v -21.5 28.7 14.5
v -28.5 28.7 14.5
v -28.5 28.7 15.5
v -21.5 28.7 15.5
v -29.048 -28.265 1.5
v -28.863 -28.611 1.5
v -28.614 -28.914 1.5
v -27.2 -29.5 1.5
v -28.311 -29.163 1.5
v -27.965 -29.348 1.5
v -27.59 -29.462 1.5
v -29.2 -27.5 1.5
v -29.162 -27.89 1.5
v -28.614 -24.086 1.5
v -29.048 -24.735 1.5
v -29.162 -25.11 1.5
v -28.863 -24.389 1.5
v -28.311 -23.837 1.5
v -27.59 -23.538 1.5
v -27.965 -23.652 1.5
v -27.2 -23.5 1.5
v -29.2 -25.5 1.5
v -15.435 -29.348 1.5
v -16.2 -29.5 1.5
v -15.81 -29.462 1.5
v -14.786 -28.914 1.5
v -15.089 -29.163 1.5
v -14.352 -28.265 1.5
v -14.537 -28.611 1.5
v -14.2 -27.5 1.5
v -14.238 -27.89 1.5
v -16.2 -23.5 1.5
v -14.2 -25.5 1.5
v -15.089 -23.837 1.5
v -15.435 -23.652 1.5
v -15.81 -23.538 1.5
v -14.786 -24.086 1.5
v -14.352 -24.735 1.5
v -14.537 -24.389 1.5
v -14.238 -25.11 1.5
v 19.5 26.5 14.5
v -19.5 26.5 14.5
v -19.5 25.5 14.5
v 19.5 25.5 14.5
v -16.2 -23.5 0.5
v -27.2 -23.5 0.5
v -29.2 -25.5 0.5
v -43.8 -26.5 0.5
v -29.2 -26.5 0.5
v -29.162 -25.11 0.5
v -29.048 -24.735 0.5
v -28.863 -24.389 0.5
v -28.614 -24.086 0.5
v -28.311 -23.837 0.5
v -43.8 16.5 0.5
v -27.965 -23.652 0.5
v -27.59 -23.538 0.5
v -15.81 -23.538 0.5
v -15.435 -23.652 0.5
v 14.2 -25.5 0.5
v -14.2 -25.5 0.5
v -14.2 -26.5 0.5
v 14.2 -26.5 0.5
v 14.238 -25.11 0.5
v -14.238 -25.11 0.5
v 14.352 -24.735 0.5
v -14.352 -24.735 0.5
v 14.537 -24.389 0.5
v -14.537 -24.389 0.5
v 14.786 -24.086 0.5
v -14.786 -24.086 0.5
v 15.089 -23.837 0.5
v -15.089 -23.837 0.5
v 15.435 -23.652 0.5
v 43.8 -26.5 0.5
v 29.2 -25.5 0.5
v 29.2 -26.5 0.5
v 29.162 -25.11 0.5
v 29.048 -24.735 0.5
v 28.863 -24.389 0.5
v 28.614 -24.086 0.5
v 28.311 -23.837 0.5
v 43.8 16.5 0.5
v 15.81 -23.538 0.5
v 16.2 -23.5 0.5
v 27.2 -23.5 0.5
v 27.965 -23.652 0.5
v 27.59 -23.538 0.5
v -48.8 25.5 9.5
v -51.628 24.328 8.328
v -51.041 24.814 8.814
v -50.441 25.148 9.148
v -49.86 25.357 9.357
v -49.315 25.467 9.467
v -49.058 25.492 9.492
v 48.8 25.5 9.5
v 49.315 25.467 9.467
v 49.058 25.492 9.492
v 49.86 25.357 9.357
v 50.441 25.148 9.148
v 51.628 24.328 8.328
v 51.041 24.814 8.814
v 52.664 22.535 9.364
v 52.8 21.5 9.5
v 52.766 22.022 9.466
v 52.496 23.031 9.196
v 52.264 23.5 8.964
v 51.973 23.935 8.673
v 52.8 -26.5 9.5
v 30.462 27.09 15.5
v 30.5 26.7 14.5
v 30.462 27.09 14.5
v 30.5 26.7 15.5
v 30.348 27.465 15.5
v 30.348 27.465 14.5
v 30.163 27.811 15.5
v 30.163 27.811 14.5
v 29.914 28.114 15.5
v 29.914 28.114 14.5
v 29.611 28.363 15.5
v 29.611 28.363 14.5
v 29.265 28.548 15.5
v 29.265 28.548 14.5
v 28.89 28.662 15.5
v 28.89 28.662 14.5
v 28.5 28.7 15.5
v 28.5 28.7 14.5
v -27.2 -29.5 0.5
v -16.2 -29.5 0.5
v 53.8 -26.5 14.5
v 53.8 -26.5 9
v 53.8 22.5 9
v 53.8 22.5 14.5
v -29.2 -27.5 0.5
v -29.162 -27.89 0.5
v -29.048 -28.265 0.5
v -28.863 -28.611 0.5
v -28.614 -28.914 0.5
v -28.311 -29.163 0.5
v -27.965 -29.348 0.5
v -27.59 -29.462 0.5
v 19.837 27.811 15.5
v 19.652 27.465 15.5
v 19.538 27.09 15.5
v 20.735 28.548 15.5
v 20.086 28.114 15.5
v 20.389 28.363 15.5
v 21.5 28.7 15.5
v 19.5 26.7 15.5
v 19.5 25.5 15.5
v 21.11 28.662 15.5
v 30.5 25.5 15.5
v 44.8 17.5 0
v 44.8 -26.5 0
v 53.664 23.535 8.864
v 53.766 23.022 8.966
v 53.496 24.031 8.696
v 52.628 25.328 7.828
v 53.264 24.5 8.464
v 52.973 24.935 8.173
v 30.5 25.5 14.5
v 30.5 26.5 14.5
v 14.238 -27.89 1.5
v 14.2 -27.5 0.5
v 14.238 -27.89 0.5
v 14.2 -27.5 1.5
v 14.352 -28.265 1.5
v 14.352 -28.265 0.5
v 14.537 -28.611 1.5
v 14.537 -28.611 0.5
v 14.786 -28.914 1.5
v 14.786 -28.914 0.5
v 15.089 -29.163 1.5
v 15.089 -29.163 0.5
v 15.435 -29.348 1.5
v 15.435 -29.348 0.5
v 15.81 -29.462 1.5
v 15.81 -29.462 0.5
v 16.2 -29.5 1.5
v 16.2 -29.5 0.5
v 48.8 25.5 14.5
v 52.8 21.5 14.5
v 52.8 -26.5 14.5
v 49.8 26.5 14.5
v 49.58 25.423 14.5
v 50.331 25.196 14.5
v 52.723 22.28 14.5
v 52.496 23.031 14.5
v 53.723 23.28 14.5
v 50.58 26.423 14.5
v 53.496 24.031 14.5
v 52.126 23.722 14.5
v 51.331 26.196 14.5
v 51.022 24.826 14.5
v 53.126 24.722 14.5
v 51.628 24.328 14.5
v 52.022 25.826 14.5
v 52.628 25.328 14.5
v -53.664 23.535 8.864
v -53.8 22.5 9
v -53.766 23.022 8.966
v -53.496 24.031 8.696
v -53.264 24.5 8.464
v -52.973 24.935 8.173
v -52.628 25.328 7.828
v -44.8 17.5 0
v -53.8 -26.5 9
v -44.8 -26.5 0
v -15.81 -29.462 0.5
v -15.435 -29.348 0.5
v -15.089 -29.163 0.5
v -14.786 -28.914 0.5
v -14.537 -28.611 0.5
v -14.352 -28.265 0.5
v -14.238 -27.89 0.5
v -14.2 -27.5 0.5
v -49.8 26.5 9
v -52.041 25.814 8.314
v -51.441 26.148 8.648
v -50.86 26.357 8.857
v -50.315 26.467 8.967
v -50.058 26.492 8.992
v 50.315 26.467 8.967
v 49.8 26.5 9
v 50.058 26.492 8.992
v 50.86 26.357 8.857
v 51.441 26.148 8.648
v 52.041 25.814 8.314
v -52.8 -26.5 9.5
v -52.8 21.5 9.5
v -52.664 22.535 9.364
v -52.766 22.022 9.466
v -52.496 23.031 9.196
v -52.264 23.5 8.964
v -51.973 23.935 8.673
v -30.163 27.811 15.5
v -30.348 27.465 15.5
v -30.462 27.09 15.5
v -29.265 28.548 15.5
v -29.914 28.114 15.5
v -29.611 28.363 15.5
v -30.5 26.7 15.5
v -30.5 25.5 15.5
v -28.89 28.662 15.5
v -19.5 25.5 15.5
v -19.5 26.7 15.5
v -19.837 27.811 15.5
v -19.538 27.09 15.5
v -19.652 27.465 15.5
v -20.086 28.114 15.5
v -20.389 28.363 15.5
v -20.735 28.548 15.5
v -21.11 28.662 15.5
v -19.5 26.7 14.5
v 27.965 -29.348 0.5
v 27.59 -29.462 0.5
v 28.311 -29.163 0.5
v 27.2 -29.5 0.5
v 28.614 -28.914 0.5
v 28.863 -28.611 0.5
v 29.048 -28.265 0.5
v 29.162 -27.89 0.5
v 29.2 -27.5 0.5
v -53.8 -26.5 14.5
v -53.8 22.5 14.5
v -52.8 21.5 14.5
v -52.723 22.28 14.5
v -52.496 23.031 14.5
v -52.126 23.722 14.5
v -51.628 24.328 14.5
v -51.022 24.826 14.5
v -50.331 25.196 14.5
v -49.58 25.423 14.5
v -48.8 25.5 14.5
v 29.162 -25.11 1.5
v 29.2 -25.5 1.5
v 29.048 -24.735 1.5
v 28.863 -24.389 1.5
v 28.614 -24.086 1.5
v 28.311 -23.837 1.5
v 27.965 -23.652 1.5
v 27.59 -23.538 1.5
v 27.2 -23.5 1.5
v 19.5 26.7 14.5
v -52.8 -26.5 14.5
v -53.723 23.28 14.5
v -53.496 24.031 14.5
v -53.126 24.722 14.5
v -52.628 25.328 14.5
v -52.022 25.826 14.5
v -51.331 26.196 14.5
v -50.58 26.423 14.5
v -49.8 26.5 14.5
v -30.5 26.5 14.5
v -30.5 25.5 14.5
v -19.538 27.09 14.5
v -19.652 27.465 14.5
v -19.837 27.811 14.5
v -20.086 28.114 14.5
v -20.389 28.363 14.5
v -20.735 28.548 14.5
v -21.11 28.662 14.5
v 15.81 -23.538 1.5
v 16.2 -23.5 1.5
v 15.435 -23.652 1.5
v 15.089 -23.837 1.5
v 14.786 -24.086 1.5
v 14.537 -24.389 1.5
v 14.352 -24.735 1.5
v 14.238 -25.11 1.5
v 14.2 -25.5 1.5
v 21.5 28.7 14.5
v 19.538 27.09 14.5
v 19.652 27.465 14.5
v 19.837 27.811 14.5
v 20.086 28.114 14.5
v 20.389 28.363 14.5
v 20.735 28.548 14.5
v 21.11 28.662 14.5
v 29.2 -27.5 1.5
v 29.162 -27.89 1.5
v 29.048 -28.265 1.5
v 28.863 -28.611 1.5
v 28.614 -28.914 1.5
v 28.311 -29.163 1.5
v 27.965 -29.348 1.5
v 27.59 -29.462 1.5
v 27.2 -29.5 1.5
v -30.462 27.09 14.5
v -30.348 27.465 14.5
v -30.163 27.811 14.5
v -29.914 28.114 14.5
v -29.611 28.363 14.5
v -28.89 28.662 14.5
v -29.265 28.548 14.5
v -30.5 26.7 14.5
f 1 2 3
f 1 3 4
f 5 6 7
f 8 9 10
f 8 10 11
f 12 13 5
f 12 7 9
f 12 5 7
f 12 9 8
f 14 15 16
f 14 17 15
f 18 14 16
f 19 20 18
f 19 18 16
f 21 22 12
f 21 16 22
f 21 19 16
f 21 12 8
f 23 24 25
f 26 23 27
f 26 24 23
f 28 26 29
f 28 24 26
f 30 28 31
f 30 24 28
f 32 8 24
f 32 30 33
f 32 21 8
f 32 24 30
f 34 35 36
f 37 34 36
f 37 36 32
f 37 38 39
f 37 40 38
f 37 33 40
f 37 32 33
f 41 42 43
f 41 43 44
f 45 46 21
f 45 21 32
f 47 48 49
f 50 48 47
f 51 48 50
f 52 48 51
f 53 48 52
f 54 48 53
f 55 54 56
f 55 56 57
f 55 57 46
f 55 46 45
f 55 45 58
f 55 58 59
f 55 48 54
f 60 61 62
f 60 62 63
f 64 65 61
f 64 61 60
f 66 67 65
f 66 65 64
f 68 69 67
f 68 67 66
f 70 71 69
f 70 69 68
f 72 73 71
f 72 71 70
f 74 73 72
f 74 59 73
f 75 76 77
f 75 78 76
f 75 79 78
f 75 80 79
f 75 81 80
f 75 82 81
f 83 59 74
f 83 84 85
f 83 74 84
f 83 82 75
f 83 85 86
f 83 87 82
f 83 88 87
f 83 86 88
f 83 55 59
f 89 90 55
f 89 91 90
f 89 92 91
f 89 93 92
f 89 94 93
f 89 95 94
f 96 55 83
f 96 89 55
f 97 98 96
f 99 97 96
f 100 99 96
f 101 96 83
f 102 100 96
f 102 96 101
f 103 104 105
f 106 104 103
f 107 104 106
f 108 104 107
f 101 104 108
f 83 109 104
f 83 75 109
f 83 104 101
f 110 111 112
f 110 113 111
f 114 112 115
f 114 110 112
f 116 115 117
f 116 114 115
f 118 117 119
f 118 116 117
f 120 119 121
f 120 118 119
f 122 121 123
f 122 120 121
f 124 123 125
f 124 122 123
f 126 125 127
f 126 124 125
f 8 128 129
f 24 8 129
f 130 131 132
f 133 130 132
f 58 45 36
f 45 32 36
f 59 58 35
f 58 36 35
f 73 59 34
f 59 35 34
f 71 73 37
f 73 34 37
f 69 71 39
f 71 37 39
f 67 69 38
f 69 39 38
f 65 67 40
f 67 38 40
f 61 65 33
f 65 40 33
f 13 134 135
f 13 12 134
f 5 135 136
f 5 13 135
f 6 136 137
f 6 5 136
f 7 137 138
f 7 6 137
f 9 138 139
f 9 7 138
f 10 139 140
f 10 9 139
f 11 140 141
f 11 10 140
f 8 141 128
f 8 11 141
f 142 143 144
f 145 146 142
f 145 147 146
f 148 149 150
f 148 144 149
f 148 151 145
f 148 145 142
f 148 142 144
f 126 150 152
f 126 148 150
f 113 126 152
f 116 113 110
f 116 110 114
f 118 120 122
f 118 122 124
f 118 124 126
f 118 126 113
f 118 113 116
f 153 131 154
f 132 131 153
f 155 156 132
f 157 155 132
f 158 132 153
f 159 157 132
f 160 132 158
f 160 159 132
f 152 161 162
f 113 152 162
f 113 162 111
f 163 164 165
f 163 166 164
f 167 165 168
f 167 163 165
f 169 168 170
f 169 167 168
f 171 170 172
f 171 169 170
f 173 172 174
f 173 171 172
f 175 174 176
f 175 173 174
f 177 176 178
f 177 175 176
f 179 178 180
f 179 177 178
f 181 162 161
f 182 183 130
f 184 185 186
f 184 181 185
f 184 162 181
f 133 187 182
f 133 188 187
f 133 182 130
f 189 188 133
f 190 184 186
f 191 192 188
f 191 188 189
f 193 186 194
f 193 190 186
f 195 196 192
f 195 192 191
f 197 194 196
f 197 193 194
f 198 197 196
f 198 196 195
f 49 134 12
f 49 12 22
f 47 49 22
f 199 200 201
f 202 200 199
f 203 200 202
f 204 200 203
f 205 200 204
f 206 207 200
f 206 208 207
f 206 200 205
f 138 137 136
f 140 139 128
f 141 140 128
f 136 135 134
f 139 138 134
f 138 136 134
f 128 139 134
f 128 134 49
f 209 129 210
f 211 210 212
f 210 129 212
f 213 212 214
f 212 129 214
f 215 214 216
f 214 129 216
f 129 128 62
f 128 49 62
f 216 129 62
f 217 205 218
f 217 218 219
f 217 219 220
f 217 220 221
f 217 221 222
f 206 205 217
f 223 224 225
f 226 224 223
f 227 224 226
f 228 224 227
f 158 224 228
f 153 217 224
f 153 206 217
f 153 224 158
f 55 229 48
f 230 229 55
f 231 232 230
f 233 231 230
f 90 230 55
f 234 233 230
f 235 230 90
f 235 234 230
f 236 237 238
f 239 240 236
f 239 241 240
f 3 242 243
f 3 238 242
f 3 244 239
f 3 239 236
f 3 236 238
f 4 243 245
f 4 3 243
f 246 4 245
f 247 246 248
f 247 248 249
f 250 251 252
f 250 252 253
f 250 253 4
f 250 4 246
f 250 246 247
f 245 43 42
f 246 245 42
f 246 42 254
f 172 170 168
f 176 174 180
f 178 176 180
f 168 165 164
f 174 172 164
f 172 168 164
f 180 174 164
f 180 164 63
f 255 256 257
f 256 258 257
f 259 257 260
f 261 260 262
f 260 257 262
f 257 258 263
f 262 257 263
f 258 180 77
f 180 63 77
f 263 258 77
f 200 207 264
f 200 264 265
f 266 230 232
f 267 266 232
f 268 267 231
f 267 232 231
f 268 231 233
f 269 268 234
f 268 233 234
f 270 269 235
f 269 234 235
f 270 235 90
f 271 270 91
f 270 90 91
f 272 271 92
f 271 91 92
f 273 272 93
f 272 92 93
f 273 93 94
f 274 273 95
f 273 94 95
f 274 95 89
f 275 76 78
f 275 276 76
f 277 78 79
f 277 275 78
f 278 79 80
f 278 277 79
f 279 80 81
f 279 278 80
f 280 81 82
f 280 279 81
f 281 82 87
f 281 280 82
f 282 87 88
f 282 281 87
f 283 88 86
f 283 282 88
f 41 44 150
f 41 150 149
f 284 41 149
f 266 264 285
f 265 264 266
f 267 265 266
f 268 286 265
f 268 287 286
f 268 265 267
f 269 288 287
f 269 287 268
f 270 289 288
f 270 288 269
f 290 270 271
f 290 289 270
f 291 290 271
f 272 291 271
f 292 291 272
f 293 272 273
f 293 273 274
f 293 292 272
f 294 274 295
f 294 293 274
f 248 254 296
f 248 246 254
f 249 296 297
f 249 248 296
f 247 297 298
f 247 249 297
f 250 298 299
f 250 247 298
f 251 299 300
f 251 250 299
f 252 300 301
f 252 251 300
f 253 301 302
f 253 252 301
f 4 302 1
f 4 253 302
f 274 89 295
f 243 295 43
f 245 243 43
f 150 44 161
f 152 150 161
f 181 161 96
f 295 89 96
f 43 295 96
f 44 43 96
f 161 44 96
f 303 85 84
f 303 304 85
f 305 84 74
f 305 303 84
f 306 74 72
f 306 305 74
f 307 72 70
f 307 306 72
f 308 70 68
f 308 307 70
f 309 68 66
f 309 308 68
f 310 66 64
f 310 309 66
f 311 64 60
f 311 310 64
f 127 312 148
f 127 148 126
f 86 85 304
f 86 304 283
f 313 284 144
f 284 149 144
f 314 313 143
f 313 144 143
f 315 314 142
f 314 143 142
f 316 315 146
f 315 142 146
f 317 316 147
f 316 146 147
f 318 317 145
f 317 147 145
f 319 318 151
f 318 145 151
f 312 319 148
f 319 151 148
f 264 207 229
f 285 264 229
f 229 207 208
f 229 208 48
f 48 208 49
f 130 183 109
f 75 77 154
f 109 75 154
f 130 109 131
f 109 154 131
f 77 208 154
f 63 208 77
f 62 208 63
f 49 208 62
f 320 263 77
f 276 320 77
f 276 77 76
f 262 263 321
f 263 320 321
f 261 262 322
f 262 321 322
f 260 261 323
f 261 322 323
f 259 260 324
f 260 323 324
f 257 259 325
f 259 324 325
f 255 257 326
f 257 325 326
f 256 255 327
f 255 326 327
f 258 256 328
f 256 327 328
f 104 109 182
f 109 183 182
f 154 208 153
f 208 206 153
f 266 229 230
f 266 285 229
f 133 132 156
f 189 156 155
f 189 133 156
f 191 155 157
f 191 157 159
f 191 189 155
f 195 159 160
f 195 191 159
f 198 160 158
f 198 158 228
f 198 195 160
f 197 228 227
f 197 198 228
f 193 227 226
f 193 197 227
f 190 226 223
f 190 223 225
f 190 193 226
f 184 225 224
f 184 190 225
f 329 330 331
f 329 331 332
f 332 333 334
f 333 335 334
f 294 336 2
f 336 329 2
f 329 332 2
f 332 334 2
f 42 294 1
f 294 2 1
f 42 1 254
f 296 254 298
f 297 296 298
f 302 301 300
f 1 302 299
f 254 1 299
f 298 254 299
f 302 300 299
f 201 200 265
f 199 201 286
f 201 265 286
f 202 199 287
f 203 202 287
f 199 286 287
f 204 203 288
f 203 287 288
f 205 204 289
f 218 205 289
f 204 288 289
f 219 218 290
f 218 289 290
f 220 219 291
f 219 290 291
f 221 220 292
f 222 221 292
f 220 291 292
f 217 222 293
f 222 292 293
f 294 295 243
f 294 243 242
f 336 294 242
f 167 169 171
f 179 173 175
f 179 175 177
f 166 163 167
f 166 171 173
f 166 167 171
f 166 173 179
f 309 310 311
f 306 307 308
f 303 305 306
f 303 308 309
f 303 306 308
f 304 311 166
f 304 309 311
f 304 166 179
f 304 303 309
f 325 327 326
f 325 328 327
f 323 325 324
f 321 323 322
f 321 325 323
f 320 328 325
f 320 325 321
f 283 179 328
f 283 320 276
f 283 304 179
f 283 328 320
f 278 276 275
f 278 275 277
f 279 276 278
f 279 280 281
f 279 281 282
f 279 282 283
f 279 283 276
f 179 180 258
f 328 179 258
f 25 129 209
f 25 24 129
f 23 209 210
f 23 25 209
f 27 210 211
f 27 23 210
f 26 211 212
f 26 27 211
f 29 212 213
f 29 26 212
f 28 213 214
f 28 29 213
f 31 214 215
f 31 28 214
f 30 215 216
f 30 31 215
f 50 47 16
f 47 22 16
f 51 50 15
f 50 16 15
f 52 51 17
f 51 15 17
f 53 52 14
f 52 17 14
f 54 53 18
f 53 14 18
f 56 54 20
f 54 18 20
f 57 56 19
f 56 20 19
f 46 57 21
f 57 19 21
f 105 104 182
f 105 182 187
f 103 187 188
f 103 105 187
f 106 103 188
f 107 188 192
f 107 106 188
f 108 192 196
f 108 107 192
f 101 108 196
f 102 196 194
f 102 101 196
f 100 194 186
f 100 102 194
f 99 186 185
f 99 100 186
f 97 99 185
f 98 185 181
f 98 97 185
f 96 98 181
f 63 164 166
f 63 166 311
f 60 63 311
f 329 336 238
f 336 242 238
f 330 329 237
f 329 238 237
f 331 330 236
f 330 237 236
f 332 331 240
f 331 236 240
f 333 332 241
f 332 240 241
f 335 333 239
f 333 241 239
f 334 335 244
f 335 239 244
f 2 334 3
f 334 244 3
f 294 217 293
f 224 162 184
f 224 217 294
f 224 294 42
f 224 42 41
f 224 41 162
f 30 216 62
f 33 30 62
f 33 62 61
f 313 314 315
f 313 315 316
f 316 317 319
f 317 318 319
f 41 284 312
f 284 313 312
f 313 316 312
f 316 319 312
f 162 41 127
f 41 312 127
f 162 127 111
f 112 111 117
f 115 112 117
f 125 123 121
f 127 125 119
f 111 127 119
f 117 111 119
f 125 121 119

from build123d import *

# Parameters (mm, degrees)
F0_W     = 107.6
F0_H     = 53
F1_DEPTH = 14.5
F2_W     = 105.6
F2_H     = 52
F3_DEPTH = 14
F4_SIZE  = 9
F5_W     = 11
F5_H     = 3.2
F6_DEPTH = 1
F7_W     = 15
F7_H     = 6
F8_DEPTH = 1
F9_R     = 2
F10_R    = 4


with BuildPart() as f1:
    # F0 (on Top) → F1 (new body)
    with BuildSketch(Plane.XY):
        Rectangle(F0_W, F0_H)
    extrude(amount=F1_DEPTH)

    # F2 (on face) → F3 (cut)
    with BuildSketch(Plane.XY.offset(14.5)):
        with Locations((0, -0.5)):
            Rectangle(F2_W, F2_H)
    extrude(amount=-F3_DEPTH, mode=Mode.SUBTRACT)

    # F4
    f4_edges = [f1.edges().sort_by_distance(p)[0] for p in [
        (53.8, 0, 0),
        (0, 26.5, 0),
        (-53.8, 0, 0),
        (-52.8, -0.5, 0.5),
        (0, 25.5, 0.5),
        (52.8, -0.5, 0.5),
    ]]
    chamfer(f4_edges, length=F4_SIZE)

    # F5 (on face) → F6 (join)
    with BuildSketch(Plane.XY.offset(14.5)):
        with Locations((-25, 27.1)):
            Rectangle(F5_W, F5_H)
        with Locations((25, 27.1)):
            Rectangle(F5_W, F5_H)
    extrude(amount=F6_DEPTH)

    # F7 (on face) → F8 (join)
    with BuildSketch(Plane.XY.offset(0.5)):
        with Locations((-21.7, -26.5)):
            Rectangle(F7_W, F7_H)
        with Locations((21.7, -26.5)):
            Rectangle(F7_W, F7_H)
    extrude(amount=F8_DEPTH)

    # F9
    f9_edges = [f1.edges().sort_by_distance(p)[0] for p in [
        (-29.2, -29.5, 1),
        (-14.2, -29.5, 1),
        (14.2, -29.5, 1),
        (29.2, -29.5, 1),
        (29.2, -23.5, 1),
        (14.2, -23.5, 1),
        (-29.2, -23.5, 1),
        (-14.2, -23.5, 1),
        (30.5, 28.7, 15),
        (19.5, 28.7, 15),
        (-19.5, 28.7, 15),
        (-30.5, 28.7, 15),
    ]]
    fillet(f9_edges, radius=F9_R)

    # F10
    f10_edges = [f1.edges().sort_by_distance(p)[0] for p in [
        (53.8, 26.5, 11.75),
        (52.8, 25.5, 12),
        (-52.8, 25.5, 12),
        (-53.8, 26.5, 11.75),
    ]]
    fillet(f10_edges, radius=F10_R)


solid = f1.part
